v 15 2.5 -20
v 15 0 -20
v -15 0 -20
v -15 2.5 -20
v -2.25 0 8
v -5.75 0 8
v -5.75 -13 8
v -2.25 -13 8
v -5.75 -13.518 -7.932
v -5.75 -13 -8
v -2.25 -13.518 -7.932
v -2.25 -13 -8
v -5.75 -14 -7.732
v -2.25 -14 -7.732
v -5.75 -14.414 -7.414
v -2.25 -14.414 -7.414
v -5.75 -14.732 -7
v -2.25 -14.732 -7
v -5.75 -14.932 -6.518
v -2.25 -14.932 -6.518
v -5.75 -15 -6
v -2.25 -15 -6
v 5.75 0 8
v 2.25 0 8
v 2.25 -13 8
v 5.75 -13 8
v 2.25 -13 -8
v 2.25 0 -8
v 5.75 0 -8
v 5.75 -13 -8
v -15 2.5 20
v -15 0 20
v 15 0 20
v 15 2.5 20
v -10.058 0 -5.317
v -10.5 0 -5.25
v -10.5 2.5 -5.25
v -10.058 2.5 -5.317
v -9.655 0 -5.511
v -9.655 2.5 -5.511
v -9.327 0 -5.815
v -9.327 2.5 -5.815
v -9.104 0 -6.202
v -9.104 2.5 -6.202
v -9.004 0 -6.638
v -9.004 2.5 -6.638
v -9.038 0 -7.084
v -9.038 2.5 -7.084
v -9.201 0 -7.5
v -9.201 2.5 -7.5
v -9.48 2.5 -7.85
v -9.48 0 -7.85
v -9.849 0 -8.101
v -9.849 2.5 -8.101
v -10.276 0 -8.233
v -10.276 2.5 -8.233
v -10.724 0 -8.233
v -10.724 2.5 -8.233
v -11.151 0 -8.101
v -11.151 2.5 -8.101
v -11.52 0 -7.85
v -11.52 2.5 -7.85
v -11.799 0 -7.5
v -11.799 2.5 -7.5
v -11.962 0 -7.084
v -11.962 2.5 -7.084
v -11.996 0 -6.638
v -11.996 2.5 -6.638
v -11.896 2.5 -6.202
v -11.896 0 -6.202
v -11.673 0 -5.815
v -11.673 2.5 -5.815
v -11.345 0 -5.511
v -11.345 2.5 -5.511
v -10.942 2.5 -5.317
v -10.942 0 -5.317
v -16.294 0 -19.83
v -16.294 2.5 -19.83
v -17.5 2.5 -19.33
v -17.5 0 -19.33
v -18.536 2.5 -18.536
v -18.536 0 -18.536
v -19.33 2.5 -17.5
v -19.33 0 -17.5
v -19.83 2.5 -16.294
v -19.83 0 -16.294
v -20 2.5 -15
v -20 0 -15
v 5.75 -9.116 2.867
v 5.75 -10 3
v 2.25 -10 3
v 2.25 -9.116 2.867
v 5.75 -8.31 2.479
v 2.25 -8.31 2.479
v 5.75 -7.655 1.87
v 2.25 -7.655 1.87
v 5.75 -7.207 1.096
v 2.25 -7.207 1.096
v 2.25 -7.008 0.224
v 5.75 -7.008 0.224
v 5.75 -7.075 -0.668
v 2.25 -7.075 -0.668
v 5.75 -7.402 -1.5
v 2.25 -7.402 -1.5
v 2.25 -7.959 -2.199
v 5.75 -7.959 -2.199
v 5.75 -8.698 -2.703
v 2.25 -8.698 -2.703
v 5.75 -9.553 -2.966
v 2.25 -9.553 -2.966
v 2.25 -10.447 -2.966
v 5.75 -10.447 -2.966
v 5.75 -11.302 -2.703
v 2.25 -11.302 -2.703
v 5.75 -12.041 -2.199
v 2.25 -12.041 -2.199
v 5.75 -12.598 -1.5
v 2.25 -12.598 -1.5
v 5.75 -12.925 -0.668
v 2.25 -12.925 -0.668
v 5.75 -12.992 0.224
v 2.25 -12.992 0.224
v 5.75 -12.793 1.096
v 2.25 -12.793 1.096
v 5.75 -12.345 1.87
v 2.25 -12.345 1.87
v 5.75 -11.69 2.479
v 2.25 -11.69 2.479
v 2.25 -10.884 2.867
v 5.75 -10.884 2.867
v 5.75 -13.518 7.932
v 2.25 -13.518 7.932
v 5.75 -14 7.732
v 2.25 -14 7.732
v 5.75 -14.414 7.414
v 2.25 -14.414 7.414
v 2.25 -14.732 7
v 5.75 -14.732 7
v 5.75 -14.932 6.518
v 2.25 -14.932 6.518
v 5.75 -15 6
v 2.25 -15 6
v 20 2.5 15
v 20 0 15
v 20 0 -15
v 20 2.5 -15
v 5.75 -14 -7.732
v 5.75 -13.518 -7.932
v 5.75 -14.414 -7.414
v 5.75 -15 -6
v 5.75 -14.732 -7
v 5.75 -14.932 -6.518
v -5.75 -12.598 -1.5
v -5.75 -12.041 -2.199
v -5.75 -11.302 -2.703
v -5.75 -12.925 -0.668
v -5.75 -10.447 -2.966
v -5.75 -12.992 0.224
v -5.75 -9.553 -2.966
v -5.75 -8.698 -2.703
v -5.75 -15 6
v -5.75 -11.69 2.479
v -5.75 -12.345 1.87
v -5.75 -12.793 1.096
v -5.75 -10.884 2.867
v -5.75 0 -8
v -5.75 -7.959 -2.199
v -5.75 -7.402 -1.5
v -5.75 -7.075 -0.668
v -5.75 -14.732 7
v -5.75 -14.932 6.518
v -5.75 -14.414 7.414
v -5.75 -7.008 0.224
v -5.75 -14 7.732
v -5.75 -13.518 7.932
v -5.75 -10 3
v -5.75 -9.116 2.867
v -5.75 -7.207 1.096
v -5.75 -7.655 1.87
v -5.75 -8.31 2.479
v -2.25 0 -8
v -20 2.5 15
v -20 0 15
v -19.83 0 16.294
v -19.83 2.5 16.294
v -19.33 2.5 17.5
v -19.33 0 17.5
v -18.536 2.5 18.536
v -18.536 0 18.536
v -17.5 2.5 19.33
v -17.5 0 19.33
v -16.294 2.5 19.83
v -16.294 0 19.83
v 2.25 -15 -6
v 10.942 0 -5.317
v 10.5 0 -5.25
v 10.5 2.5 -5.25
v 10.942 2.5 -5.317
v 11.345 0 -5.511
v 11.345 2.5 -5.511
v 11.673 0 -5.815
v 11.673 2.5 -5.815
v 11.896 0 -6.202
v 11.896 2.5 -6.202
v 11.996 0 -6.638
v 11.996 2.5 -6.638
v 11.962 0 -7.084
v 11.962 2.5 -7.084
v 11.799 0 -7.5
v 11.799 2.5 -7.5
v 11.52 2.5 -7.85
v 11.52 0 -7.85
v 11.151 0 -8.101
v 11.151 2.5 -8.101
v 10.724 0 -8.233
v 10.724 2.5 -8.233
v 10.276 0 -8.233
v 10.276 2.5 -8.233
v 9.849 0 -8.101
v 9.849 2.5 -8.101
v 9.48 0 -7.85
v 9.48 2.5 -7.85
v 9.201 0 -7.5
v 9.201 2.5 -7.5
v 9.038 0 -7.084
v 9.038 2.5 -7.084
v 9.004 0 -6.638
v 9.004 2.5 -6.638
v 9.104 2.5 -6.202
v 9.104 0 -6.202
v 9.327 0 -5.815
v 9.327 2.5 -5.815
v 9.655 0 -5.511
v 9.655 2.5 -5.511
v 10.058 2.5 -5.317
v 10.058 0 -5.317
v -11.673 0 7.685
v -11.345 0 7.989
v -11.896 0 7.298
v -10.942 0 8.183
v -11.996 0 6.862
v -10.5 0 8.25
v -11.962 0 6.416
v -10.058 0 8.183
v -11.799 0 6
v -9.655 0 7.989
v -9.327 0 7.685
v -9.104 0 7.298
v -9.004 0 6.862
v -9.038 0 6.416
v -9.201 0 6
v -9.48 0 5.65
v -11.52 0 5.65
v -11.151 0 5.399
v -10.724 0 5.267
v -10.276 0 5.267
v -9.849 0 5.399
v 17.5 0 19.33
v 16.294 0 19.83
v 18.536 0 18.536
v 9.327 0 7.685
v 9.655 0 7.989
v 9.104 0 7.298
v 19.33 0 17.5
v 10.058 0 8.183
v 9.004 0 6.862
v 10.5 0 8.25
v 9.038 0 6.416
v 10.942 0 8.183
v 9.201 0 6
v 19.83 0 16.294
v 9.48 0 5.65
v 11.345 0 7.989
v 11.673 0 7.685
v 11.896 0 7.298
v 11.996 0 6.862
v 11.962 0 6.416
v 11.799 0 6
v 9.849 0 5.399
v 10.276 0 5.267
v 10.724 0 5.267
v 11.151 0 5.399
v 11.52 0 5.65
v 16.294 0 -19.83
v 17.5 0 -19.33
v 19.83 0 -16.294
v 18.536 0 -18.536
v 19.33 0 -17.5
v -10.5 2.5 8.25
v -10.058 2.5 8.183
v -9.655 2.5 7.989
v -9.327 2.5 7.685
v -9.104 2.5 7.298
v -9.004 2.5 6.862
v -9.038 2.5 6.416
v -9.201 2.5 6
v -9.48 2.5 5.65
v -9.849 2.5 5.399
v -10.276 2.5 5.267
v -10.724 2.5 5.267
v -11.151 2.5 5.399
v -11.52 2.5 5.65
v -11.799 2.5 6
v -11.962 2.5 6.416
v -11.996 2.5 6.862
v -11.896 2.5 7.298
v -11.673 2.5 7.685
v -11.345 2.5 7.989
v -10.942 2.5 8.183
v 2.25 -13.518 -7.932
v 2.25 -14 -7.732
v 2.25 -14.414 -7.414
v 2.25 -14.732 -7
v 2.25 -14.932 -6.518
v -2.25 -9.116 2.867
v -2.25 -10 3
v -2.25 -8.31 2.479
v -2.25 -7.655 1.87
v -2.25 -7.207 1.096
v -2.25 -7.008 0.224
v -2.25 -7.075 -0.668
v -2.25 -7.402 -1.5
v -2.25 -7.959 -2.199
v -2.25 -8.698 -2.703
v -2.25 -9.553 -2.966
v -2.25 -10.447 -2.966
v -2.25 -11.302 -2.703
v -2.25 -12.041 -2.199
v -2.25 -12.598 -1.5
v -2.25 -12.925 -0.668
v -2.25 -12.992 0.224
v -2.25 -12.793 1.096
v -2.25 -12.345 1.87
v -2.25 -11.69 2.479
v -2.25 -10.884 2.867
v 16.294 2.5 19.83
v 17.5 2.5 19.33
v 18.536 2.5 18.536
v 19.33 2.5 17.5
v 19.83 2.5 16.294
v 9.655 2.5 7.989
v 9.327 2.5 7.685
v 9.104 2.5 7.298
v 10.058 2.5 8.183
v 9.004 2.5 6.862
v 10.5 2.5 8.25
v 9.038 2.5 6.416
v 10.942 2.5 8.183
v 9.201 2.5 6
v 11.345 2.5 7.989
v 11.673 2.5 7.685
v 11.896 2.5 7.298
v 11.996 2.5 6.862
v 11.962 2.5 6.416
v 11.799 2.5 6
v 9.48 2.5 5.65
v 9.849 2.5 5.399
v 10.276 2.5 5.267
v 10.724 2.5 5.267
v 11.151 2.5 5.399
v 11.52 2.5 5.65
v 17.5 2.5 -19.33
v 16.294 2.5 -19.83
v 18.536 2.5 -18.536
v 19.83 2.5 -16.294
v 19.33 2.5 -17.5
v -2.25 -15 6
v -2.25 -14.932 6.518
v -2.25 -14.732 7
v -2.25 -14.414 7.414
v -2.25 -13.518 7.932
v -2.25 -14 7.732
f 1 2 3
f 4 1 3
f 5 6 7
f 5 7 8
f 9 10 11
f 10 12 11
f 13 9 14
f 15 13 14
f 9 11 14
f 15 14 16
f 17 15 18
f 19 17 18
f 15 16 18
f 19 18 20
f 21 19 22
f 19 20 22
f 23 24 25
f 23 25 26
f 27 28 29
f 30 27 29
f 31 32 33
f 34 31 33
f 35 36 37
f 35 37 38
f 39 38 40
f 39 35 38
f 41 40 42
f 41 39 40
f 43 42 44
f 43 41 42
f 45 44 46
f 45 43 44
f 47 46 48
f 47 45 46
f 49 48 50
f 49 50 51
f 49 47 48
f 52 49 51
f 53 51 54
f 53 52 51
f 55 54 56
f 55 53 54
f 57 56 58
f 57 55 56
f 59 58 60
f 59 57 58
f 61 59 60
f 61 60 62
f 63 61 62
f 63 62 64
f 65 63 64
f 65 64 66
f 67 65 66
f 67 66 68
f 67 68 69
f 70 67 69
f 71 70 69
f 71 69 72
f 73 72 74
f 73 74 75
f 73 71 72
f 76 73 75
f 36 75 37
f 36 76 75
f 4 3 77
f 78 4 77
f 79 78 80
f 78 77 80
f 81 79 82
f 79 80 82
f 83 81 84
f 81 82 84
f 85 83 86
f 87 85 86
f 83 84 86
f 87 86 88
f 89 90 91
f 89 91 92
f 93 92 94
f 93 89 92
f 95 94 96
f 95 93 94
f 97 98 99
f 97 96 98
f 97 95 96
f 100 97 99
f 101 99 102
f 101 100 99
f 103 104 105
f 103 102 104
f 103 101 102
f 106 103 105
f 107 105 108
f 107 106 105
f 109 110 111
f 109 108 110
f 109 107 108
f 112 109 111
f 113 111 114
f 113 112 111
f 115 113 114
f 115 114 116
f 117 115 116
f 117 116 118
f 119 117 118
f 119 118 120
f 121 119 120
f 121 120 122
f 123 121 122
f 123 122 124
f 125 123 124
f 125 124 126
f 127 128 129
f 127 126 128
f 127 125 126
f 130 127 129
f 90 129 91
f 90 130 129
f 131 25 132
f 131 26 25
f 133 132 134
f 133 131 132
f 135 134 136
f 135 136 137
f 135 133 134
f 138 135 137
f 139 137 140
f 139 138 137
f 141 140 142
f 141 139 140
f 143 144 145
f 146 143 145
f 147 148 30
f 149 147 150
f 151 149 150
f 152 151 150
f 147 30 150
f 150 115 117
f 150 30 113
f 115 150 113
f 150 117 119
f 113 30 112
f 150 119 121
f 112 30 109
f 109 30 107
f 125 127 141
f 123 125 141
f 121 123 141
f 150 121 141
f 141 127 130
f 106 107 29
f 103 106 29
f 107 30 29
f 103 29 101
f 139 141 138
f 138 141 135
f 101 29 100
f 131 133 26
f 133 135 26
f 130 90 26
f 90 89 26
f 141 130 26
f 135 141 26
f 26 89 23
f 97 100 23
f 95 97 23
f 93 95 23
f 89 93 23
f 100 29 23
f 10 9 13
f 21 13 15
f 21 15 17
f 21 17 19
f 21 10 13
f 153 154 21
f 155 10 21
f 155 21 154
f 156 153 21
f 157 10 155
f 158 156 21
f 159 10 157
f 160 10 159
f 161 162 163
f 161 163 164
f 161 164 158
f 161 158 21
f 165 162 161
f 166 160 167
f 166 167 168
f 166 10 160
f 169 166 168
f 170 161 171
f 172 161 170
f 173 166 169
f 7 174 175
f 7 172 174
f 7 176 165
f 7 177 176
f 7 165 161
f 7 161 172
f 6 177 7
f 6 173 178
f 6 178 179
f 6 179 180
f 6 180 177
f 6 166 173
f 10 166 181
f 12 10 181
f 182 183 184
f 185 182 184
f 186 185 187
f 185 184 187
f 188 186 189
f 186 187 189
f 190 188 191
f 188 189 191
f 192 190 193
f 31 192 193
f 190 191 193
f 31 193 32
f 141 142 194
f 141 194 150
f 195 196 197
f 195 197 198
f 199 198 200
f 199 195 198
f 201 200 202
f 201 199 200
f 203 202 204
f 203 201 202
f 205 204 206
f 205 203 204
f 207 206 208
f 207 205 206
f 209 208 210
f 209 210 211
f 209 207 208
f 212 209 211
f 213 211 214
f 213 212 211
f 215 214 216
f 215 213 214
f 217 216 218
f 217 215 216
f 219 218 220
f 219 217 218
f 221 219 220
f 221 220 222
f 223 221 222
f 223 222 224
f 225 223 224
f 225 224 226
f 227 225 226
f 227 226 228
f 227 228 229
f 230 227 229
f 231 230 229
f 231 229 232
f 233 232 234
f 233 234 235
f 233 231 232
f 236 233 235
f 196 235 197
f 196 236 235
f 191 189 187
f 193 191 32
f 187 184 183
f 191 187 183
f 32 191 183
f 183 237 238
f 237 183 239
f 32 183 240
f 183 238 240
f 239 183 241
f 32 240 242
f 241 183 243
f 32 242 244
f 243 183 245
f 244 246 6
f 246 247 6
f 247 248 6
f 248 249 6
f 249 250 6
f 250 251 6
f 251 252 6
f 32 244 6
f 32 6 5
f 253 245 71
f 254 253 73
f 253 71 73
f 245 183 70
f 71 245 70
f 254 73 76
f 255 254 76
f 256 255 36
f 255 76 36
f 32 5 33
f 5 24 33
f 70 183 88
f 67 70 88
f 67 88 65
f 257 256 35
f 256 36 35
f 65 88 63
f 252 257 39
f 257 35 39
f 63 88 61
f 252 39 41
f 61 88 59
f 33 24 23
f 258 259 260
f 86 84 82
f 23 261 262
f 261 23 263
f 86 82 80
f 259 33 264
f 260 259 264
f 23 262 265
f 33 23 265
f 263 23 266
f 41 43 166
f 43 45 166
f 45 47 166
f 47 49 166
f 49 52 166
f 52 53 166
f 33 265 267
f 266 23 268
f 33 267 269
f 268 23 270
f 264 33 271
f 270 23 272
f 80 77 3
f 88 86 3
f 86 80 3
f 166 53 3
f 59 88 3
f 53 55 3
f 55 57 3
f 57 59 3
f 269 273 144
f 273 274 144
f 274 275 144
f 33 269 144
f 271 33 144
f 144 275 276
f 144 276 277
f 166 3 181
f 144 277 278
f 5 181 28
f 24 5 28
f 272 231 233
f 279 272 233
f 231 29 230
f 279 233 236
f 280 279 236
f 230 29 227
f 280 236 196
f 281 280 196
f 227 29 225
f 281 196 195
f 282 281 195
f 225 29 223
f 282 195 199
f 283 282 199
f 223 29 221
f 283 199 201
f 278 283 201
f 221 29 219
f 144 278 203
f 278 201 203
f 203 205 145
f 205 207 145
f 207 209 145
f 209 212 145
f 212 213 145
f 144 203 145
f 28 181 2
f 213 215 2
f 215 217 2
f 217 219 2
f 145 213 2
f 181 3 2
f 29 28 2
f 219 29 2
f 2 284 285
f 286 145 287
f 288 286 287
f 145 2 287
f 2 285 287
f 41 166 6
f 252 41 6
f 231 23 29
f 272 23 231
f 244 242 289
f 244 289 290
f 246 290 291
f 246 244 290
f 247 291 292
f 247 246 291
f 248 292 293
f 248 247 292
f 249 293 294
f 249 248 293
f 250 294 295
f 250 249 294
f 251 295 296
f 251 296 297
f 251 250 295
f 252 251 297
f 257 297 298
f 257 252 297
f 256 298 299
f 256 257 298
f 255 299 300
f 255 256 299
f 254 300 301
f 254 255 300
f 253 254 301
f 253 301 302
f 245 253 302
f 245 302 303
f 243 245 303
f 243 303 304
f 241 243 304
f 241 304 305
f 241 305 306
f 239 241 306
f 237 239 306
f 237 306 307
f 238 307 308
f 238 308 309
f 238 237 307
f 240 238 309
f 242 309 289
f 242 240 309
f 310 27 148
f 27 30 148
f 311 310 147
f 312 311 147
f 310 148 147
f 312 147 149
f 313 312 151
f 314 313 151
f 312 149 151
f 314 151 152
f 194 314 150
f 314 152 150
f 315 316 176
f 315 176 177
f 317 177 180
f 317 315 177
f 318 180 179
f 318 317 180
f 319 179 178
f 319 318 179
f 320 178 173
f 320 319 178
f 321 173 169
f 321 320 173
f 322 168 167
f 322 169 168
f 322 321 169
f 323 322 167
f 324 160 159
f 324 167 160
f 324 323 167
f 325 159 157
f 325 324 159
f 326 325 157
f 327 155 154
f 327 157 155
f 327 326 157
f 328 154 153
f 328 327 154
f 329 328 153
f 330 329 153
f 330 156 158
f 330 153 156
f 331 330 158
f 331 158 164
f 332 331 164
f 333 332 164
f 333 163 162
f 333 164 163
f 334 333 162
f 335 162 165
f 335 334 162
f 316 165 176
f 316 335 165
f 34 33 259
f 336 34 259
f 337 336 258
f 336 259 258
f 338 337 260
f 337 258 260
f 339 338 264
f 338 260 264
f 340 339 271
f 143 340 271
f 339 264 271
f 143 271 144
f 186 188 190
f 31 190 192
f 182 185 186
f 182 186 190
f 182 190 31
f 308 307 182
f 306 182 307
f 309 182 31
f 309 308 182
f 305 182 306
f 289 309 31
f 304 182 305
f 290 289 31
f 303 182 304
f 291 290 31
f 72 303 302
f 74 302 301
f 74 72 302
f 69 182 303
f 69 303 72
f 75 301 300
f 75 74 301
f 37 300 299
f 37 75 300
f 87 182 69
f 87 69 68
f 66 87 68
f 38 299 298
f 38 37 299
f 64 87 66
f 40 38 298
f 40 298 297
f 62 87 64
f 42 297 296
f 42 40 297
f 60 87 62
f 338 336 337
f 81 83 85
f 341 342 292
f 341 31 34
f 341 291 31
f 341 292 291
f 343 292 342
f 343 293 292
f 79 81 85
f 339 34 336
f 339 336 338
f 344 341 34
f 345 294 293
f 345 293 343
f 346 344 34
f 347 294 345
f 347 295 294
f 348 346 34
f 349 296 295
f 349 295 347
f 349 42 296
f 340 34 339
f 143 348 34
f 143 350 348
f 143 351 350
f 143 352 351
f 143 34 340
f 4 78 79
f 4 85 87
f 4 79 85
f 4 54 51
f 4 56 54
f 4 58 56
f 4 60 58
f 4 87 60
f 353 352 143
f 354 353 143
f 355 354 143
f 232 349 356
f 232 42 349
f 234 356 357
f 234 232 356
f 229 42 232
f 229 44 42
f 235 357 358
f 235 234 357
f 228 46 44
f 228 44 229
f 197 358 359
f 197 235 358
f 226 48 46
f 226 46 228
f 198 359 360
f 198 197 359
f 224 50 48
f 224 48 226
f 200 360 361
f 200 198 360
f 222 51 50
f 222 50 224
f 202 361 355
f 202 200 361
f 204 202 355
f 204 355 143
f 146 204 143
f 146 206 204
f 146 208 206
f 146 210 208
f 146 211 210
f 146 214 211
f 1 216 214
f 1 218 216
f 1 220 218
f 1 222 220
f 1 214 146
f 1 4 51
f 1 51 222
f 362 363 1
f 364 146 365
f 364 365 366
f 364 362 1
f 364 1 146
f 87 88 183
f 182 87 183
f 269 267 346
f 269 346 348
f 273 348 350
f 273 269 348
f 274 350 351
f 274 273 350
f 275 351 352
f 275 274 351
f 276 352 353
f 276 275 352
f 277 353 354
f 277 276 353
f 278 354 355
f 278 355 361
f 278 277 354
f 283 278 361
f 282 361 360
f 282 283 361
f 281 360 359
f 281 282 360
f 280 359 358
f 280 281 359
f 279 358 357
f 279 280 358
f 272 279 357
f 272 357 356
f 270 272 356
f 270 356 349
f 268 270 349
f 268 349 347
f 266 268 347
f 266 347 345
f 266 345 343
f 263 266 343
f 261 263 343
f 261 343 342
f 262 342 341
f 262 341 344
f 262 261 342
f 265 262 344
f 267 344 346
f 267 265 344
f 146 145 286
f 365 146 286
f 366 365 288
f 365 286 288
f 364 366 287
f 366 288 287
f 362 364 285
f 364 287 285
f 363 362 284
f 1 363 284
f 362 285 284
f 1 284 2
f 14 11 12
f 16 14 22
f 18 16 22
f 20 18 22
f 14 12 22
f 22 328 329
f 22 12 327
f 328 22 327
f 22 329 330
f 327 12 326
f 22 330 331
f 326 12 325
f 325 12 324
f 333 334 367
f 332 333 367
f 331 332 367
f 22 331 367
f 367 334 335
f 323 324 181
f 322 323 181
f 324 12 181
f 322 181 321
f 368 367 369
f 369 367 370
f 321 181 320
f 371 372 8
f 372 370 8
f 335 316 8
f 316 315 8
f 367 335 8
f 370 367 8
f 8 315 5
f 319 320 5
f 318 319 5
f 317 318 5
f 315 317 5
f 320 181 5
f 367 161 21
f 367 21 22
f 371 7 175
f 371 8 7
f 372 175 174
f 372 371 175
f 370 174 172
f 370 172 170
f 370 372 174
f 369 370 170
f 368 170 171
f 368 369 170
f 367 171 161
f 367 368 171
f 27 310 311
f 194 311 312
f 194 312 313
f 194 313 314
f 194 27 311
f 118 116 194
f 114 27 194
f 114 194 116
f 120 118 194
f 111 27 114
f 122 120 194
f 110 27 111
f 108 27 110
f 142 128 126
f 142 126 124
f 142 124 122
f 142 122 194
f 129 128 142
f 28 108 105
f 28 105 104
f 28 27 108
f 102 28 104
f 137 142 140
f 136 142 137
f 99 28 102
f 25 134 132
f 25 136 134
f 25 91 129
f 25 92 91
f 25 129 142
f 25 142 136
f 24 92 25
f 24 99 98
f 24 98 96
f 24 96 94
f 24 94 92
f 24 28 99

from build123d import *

# Parameters (mm, degrees)
SKETCH1_R               = 1.5
BOSS_EXTRUDE1_DEPTH     = 2.5
SKETCH2_W               = 3.5
SKETCH2_H               = 16
BOSS_EXTRUDE2_DEPTH     = 15
FILLET1_R               = 2
CUT_EXTRUDE1_DEPTH      = 36.889587626
CUT_EXTRUDE1_DEPTH_BACK = 36.889587626
SKETCH3_R               = 3


with BuildPart() as part:
    # Sketch1 → Boss-Extrude1 (new body)
    with BuildSketch(Plane(origin=(0, 0, 0), x_dir=(1, 0, 0), z_dir=(0, 1, 0))):
        with BuildLine():
            Line((15, 20), (-15, 20))
            ThreePointArc((-15, 20), (-18.535533906, 18.535533906), (-20, 15))
            Line((-20, 15), (-20, -15))
            ThreePointArc((-20, -15), (-18.535533906, -18.535533906), (-15, -20))
            Line((-15, -20), (15, -20))
            ThreePointArc((15, -20), (18.535533906, -18.535533906), (20, -15))
            Line((20, -15), (20, 15))
            ThreePointArc((20, 15), (18.535533906, 18.535533906), (15, 20))
        make_face()
        with Locations(Location((10.5, -6.75, 0), (0, 0, 270))):
            Circle(SKETCH1_R, mode=Mode.SUBTRACT)
        with Locations(Location((-10.5, -6.75, 0), (0, 0, 270))):
            Circle(SKETCH1_R, mode=Mode.SUBTRACT)
        with Locations(Location((-10.5, 6.75, 0), (0, 0, 270))):
            Circle(SKETCH1_R, mode=Mode.SUBTRACT)
        with Locations(Location((10.5, 6.75, 0), (0, 0, 270))):
            Circle(SKETCH1_R, mode=Mode.SUBTRACT)
    extrude(amount=BOSS_EXTRUDE1_DEPTH)

    # Sketch2 → Boss-Extrude2 (add)
    with BuildSketch(Plane.XZ):
        with Locations((-4, 0)):
            Rectangle(SKETCH2_W, SKETCH2_H)
        with Locations((4, 0)):
            Rectangle(SKETCH2_W, SKETCH2_H)
    extrude(amount=BOSS_EXTRUDE2_DEPTH)

    # Fillet1
    fillet1_edges = [part.edges().sort_by_distance(p)[0] for p in [
        (-4, -15, -8),
        (-4, -15, 8),
        (4, -15, -8),
        (4, -15, 8),
    ]]
    fillet(fillet1_edges, radius=FILLET1_R)

    # Sketch3 → Cut-Extrude1 (cut, two sides: drawn at the far end of the back side and taken through both)
    with BuildSketch(Plane.ZY.offset(5.75).offset(-CUT_EXTRUDE1_DEPTH_BACK)):
        with Locations((0, -10)):
            Circle(SKETCH3_R)
    extrude(amount=CUT_EXTRUDE1_DEPTH + CUT_EXTRUDE1_DEPTH_BACK, mode=Mode.SUBTRACT)


solid = part.part
